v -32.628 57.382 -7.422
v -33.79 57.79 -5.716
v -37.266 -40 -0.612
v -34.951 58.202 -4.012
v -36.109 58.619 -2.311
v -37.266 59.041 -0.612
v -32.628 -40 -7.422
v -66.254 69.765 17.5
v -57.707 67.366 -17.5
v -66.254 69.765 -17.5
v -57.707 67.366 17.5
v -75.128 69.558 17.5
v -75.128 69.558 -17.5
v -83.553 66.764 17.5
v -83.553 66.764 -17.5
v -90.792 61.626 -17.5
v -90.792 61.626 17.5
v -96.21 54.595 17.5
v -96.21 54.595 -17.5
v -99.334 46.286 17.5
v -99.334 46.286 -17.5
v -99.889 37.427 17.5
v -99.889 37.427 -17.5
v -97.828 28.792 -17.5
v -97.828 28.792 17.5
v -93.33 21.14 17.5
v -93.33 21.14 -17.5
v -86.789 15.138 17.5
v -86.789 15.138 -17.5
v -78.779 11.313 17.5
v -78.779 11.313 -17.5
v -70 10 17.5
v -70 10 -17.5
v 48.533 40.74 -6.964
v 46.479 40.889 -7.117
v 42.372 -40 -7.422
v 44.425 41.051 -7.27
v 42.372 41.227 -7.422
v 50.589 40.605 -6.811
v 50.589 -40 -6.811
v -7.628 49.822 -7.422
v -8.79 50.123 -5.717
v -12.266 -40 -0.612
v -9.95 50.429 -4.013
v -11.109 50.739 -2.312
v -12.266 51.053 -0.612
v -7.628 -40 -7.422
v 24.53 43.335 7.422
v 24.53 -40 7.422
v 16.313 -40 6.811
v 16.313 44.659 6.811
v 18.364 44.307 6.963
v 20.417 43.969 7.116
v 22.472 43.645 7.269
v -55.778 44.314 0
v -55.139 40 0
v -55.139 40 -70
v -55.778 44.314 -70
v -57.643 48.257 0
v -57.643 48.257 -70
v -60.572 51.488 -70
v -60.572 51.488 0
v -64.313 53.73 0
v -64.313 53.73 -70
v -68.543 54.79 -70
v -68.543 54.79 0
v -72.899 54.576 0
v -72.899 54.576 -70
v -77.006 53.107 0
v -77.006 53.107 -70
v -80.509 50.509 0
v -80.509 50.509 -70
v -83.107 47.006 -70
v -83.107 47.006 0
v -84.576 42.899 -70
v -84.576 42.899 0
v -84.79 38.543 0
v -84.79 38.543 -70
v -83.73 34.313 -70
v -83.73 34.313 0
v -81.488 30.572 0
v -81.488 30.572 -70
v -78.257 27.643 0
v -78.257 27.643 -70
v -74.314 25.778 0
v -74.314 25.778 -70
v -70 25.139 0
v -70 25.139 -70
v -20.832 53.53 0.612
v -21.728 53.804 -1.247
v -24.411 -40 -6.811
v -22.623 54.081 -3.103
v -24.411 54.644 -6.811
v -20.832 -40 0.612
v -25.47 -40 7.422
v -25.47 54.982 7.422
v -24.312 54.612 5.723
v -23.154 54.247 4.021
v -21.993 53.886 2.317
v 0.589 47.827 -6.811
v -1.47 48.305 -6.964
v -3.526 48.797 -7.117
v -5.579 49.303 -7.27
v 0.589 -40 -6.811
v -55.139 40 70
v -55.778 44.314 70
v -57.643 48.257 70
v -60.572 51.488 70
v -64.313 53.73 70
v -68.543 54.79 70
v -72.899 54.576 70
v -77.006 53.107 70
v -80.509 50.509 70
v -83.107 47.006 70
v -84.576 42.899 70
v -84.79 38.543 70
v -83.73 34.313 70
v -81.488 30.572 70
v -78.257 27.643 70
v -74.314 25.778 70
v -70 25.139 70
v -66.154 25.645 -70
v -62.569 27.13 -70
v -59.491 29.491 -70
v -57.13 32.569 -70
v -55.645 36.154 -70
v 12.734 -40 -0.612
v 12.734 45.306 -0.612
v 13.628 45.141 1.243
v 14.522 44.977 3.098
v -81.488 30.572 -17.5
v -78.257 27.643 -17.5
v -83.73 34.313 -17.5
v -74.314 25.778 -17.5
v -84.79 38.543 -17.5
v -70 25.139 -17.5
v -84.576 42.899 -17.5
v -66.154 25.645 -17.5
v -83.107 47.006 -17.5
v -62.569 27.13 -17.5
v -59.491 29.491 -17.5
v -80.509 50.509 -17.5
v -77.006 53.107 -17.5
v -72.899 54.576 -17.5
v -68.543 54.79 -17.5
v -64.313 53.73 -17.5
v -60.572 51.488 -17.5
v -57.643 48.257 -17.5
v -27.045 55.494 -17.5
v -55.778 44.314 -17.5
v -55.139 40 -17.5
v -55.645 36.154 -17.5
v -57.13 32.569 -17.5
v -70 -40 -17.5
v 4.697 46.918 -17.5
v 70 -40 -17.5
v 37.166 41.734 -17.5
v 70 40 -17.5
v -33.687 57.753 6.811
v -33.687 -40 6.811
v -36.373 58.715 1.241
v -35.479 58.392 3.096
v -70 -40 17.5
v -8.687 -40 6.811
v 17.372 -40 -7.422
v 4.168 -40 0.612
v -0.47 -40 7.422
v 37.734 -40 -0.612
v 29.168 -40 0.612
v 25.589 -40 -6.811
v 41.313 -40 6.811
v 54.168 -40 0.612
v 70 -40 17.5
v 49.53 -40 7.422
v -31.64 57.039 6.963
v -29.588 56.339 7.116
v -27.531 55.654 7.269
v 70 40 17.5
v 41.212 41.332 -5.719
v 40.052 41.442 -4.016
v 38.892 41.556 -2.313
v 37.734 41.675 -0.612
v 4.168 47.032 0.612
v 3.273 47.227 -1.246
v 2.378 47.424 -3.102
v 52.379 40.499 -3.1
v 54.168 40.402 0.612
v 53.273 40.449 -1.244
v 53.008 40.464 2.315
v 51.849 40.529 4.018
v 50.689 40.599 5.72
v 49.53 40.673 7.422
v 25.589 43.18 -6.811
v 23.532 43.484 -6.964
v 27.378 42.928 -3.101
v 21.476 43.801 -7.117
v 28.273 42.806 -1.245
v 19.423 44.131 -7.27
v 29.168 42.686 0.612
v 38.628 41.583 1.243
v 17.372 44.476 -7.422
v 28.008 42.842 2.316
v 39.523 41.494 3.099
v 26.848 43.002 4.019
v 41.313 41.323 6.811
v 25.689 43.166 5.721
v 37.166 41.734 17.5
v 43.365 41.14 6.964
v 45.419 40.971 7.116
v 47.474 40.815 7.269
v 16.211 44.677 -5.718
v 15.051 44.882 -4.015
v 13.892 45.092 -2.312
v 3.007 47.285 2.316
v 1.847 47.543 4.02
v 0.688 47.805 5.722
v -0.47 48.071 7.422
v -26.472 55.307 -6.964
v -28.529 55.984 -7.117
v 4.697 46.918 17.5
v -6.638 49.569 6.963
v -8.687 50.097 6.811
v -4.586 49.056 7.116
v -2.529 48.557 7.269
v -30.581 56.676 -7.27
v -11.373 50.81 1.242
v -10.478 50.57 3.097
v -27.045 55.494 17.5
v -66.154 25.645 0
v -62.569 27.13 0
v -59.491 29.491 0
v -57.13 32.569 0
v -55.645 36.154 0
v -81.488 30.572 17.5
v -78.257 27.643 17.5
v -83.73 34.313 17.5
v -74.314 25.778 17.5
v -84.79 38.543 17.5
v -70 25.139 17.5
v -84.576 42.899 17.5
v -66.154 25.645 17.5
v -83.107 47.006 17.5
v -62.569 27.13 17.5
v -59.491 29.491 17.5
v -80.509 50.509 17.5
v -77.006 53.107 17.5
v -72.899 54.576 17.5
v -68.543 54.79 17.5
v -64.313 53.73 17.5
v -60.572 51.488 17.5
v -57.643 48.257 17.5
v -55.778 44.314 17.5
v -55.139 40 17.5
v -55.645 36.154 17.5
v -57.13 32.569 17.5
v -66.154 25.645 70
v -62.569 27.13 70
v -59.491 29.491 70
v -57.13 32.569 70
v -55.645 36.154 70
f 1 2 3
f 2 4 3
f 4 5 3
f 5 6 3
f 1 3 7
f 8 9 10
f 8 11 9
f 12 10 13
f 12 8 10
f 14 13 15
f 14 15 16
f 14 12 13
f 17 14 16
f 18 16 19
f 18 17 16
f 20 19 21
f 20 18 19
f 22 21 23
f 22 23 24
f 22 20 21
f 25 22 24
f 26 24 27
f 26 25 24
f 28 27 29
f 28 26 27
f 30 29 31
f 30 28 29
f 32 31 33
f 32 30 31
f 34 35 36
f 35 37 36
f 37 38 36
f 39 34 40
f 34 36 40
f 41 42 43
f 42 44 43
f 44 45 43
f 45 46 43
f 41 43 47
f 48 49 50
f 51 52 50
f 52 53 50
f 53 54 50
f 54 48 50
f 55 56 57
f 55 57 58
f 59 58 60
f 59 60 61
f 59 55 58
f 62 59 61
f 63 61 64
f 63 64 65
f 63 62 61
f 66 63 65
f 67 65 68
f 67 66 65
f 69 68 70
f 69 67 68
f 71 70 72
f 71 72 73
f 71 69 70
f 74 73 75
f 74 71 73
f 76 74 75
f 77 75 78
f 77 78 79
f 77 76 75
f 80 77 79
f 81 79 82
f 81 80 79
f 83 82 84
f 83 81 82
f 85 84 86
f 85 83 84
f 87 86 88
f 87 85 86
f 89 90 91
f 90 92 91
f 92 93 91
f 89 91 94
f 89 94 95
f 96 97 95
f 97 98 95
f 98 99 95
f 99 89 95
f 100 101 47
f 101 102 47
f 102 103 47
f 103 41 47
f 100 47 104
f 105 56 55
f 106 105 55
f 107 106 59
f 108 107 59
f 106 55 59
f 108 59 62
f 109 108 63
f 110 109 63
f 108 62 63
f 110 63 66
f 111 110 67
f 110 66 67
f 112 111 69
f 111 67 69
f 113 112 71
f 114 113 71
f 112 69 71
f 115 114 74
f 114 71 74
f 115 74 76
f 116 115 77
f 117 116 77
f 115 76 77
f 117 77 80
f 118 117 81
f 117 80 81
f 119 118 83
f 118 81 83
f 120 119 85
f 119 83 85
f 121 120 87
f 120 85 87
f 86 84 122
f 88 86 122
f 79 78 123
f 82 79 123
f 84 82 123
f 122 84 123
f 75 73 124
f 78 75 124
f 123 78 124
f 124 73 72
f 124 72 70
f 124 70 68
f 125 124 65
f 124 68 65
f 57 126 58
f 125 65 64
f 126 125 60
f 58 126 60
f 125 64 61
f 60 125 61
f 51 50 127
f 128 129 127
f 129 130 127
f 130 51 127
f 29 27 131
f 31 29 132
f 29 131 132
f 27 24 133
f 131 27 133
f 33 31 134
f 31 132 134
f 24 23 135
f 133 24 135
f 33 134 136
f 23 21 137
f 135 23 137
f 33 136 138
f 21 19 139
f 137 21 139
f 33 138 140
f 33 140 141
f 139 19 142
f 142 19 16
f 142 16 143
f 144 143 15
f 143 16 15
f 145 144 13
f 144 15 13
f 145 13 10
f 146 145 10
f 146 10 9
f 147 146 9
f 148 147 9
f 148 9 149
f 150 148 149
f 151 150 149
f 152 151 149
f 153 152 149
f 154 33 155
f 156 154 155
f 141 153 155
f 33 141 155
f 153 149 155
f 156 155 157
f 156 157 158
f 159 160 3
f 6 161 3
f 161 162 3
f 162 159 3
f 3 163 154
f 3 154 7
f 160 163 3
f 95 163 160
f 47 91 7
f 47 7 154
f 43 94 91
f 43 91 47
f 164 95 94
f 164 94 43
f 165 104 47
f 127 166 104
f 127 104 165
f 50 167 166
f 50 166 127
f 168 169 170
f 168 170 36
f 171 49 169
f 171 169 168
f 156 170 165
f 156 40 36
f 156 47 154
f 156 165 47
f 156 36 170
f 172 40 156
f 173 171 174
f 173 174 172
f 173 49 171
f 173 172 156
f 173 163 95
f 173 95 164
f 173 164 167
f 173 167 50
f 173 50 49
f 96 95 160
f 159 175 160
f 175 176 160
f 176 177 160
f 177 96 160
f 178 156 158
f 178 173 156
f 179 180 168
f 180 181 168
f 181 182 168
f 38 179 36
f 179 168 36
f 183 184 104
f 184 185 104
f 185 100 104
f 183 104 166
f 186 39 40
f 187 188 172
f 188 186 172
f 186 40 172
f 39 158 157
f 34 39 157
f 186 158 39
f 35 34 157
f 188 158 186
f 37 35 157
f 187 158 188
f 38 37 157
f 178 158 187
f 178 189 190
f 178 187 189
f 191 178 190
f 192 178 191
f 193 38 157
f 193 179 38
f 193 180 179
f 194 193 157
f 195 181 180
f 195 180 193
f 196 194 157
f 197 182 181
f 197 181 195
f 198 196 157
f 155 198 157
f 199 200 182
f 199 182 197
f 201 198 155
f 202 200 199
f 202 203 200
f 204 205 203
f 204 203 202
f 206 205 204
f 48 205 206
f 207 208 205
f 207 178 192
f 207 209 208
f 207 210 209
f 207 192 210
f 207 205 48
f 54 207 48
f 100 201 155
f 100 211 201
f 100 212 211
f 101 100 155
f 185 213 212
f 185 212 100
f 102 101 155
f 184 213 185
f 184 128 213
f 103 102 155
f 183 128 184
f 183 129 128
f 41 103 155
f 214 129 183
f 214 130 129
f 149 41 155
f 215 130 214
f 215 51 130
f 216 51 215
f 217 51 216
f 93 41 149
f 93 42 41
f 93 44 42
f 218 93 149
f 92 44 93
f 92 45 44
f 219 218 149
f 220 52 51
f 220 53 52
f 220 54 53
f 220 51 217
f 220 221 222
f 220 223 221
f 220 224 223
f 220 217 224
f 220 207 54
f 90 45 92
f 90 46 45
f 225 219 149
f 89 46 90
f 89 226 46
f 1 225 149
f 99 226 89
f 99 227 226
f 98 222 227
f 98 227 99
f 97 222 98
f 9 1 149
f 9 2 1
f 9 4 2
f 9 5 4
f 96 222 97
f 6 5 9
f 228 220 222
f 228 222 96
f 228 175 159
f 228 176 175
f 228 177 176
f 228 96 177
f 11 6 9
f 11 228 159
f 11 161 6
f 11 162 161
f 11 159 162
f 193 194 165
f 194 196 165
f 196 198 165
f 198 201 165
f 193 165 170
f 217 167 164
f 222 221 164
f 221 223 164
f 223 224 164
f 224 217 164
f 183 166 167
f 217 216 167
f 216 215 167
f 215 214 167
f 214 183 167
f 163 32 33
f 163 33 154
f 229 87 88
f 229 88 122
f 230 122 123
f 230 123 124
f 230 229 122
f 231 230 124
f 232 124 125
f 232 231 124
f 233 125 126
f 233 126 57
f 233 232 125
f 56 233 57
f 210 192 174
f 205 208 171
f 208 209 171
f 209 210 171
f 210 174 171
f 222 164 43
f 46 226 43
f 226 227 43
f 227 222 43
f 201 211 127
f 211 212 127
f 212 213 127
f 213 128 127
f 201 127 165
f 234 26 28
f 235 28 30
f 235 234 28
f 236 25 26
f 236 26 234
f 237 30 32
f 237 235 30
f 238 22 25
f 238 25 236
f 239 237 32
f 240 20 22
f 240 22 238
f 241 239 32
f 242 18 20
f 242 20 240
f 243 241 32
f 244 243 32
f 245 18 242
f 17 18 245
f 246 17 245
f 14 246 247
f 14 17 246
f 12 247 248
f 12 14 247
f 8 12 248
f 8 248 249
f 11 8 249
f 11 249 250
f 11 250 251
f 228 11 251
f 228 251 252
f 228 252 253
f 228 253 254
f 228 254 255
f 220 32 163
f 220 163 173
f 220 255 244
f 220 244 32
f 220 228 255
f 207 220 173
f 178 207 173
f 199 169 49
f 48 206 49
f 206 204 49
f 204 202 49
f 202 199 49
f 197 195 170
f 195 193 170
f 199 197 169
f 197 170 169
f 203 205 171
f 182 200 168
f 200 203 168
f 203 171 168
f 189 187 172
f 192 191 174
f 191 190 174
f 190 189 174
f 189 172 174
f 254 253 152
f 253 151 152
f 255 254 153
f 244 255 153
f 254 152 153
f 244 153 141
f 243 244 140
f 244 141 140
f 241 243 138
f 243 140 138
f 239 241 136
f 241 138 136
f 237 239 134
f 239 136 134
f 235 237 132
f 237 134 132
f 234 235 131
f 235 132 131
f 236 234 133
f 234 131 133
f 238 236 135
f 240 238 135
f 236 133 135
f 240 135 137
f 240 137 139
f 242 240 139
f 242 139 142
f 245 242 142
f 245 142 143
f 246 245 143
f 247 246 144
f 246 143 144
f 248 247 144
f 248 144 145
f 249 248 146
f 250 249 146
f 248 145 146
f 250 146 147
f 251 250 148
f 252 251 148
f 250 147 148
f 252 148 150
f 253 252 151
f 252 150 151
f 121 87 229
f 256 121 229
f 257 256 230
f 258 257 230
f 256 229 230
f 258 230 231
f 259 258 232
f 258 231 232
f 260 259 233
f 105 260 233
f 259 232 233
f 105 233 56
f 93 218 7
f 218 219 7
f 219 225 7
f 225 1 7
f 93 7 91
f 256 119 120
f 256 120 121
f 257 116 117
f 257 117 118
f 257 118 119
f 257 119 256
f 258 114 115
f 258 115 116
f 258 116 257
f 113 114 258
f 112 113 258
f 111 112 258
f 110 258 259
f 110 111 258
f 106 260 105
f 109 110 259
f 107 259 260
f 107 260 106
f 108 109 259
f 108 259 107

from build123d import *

# Parameters (mm, degrees)
F1_DEPTH = 17.5
F2_DEPTH = 70
F4_DEPTH = 110.001


with BuildPart() as f1:
    # F0 (on Top) → F1 (new body, symmetric)
    with BuildSketch(Plane.XY):
        with BuildLine():
            Line((-70, -40), (70, -40))
            Line((70, -40), (70, 40))
            Line((70, 40), (-40, 40))
            ThreePointArc((-40, 40), (-48.7867965644, 18.7867965644), (-70, 10))
            Line((-70, 10), (-70, -40))
        make_face()
        with BuildLine():
            Line((-40, 40), (70, 40))
            ThreePointArc((70, 40), (4.6967673455, 46.9182476125), (-57.7073170732, 67.3658536585))
            ThreePointArc((-57.7073170732, 67.3658536585), (-44.8128952854, 56.2975383447), (-40, 40))
        make_face()
        with BuildLine():
            ThreePointArc((-57.7073170732, 67.3658536585), (-99.3340724223, 46.2858726619), (-70, 10))
            Line((-70, 10), (-70, 25.1385026563))
            ThreePointArc((-70, 25.1385026563), (-80.5086655503, 50.5086655503), (-55.1385026563, 40))
            Line((-55.1385026563, 40), (-40, 40))
            ThreePointArc((-40, 40), (-44.8128952854, 56.2975383447), (-57.7073170732, 67.3658536585))
        make_face()
        with BuildLine():
            Line((-70, 25.1385026563), (-70, 10))
            ThreePointArc((-70, 10), (-48.7867965644, 18.7867965644), (-40, 40))
            Line((-40, 40), (-55.1385026563, 40))
            ThreePointArc((-55.1385026563, 40), (-59.4913344497, 29.4913344497), (-70, 25.1385026563))
        make_face()
    extrude(amount=F1_DEPTH, both=True)

    # F3 (on face) → F4 (cut, through all)
    with BuildSketch(Plane.XZ.offset(40)):
        Polygon((24.5300985992, 7.4222810249), (16.3126487285, 6.8107596599), (12.7335168302, -0.611521365), (17.3718348026, -7.4222810249), (25.5892846733, -6.8107596599), (29.1684165716, 0.611521365), align=None)
        Polygon((49.5300985992, 7.4222810249), (41.3126487285, 6.8107596599), (37.7335168302, -0.611521365), (42.3718348026, -7.4222810249), (50.5892846733, -6.8107596599), (54.1684165716, 0.611521365), align=None)
        Polygon((-0.4699014008, 7.4222810249), (-8.6873512715, 6.8107596599), (-12.2664831698, -0.611521365), (-7.6281651974, -7.4222810249), (0.5892846733, -6.8107596599), (4.1684165716, 0.611521365), align=None)
        Polygon((-32.6281651974, -7.4222810249), (-24.4107153267, -6.8107596599), (-20.8315834284, 0.611521365), (-25.4699014008, 7.4222810249), (-33.6873512715, 6.8107596599), (-37.2664831698, -0.611521365), align=None)
    extrude(amount=-F4_DEPTH, mode=Mode.SUBTRACT)


with BuildPart() as f2:
    # F0 (on Top) → F2 (new body, symmetric)
    with BuildSketch(Plane.XY):
        with BuildLine():
            ThreePointArc((-55.1385026563, 40), (-80.5086655503, 50.5086655503), (-70, 25.1385026563))
            Line((-70, 25.1385026563), (-70, 40))
            Line((-70, 40), (-55.1385026563, 40))
        make_face()
        with BuildLine():
            Line((-70, 40), (-70, 25.1385026563))
            ThreePointArc((-70, 25.1385026563), (-59.4913344497, 29.4913344497), (-55.1385026563, 40))
            Line((-55.1385026563, 40), (-70, 40))
        make_face()
    extrude(amount=F2_DEPTH, both=True)


solid = Compound([f1.part, f2.part])
